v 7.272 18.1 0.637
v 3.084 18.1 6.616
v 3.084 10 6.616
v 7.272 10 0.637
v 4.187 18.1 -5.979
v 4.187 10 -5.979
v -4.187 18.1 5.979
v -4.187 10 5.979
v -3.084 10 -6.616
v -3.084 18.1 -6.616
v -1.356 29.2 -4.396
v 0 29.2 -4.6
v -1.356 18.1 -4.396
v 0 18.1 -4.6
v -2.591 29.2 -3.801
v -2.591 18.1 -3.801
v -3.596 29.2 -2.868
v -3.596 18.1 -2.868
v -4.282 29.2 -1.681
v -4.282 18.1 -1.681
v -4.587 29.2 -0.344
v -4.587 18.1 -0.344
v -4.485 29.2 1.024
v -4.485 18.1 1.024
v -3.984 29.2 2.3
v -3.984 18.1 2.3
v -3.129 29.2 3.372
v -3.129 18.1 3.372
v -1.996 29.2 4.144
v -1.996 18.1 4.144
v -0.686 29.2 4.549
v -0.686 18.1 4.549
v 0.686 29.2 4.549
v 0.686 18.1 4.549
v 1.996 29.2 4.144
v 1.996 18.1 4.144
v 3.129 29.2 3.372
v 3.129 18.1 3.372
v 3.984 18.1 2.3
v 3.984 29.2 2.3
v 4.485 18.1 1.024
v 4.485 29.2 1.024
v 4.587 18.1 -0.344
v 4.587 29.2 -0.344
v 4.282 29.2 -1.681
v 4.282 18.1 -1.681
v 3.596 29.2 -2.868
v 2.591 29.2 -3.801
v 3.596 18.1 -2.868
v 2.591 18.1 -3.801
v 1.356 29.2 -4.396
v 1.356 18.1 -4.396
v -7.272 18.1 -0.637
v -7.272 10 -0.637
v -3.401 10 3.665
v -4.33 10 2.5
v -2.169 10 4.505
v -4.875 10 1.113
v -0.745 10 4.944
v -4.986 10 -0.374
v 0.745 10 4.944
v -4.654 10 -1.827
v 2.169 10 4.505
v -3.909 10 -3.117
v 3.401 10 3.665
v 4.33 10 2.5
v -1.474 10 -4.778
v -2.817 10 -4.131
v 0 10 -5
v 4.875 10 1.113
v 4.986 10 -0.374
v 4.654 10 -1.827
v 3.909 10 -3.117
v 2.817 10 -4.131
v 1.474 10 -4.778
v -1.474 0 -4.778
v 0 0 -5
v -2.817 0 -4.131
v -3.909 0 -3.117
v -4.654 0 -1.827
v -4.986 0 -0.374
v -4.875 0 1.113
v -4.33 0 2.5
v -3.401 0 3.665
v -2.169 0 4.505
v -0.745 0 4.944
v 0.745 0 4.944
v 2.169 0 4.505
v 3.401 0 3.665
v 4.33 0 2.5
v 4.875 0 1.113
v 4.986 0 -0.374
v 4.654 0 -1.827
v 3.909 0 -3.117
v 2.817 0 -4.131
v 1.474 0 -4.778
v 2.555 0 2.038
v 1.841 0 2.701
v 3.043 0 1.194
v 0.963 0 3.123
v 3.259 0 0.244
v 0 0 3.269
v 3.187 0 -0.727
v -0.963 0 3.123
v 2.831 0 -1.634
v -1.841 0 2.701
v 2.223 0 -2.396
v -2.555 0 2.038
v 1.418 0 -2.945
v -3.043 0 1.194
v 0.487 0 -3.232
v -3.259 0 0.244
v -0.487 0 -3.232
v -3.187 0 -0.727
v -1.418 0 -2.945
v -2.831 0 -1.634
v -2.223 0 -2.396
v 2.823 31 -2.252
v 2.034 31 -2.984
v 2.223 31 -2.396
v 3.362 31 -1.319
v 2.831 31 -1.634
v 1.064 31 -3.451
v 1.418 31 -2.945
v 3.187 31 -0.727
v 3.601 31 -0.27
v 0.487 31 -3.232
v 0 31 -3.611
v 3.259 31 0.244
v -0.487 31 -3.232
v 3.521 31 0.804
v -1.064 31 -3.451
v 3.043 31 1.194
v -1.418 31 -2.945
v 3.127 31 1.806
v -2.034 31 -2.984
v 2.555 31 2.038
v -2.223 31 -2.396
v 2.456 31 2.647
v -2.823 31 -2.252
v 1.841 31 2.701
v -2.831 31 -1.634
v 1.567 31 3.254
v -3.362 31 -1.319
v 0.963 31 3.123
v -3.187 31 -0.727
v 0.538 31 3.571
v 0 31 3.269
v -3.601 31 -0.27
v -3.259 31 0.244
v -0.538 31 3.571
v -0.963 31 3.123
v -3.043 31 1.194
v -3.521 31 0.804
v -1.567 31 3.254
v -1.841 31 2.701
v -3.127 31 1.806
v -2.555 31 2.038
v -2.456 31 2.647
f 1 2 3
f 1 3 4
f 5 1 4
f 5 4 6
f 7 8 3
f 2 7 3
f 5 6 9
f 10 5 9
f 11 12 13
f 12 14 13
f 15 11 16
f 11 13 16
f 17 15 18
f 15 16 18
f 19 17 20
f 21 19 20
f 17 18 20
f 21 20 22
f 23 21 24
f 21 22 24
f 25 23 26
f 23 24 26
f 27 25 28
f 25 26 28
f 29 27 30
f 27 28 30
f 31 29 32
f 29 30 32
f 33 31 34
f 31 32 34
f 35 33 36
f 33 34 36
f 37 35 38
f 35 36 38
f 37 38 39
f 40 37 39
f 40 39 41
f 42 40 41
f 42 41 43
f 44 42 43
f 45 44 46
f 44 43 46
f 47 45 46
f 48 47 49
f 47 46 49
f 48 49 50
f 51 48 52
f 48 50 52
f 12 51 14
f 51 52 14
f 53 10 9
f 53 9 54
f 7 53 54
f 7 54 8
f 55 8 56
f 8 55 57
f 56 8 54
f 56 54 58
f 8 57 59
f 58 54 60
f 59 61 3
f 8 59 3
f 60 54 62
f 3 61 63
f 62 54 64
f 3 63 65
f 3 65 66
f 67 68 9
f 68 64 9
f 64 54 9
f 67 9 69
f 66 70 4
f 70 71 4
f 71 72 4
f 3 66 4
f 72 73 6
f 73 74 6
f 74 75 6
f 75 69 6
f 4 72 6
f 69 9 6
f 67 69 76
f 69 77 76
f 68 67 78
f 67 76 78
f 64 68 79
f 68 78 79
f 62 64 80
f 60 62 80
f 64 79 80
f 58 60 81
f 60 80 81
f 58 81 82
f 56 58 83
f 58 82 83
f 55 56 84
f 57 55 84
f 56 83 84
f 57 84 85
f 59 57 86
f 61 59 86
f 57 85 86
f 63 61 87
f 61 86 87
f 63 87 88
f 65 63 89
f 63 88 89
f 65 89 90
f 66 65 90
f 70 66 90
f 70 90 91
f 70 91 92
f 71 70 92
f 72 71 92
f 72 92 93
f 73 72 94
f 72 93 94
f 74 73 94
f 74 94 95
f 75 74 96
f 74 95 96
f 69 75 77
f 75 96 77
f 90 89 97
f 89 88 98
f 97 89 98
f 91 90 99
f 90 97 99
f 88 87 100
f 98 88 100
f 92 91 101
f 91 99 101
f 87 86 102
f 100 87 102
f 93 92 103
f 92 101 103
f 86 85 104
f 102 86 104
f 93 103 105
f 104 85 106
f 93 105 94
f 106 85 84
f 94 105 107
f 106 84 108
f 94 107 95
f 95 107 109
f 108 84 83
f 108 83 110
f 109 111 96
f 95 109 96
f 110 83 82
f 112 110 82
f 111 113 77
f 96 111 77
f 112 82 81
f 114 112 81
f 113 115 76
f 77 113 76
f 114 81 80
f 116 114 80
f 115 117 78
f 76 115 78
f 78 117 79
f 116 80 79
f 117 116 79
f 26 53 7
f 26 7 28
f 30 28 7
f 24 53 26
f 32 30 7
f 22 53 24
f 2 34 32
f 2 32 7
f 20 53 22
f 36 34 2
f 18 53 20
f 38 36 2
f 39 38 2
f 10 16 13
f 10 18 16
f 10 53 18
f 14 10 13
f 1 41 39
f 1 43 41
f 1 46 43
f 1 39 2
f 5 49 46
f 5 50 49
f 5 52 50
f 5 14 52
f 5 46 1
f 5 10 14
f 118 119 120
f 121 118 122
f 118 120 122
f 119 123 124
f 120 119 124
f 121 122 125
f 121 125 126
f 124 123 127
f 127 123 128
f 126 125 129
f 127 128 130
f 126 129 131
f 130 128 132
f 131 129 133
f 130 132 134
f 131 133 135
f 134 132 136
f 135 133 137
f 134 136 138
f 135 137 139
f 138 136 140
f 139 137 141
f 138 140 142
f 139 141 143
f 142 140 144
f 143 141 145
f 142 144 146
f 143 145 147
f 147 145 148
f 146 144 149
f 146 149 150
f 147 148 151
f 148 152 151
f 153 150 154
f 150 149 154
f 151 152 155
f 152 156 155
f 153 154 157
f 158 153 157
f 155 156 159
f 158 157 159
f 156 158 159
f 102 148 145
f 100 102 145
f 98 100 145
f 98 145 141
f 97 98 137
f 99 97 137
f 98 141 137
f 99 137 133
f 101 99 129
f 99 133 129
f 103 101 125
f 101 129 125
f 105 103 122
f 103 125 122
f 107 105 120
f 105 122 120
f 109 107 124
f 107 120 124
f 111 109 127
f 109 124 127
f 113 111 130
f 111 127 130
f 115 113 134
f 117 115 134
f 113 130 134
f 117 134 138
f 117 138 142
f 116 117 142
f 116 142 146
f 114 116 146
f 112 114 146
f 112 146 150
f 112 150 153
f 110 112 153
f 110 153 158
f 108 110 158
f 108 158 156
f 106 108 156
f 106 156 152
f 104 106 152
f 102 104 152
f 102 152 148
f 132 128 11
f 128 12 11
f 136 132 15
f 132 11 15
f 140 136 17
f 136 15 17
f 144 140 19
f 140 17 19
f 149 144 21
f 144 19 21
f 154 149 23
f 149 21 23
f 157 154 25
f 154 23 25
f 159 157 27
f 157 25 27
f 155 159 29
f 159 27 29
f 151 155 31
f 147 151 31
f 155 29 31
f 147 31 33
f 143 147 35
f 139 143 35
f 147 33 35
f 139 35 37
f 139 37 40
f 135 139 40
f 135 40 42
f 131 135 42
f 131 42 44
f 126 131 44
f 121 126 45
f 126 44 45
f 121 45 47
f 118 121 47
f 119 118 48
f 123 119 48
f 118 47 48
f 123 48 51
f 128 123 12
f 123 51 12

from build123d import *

# Parameters (mm, degrees)
BOSS_EXTRUDE1_DEPTH = 8.1
SKETCH3_R           = 3.268605963
CUT_EXTRUDE1_DEPTH  = 40


with BuildPart() as part:
    # Sketch1 → Revolve1 (revolve)
    with BuildSketch(Plane.XY, mode=Mode.PRIVATE) as revolve1_sk:
        Polygon((0, 0), (0, 31), (3.611174949, 31), (4.6, 29.2), (4.6, 18.1), (6.3, 18.1), (6.3, 10), (5, 10), (5, 0), align=None)
    revolve(revolve1_sk.sketch.rotate(Axis((0, 0, 0), (0, 1, 0)), 90), axis=Axis((0, 0, 0), (0, 1, 0)))

    # Sketch2 → Boss-Extrude1 (add)
    with BuildSketch(Plane(origin=(0, 18.1, 0), x_dir=(1, 0, 0), z_dir=(0, 1, 0))):
        Polygon((7.271508979, -0.636593264), (4.187060428, 5.979014867), (-3.08444855, 6.615608132), (-7.271508979, 0.636593264), (-4.187060428, -5.979014867), (3.08444855, -6.615608132), align=None)
    extrude(amount=-BOSS_EXTRUDE1_DEPTH)

    # Sketch3 → Cut-Extrude1 (cut)
    with BuildSketch(Plane(origin=(0, 31, 0), x_dir=(1, 0, 0), z_dir=(0, 1, 0))):
        with Locations(Location((0, 0, 0), (0, 0, 270))):
            Circle(SKETCH3_R)
    extrude(amount=-CUT_EXTRUDE1_DEPTH, mode=Mode.SUBTRACT)


solid = part.part
